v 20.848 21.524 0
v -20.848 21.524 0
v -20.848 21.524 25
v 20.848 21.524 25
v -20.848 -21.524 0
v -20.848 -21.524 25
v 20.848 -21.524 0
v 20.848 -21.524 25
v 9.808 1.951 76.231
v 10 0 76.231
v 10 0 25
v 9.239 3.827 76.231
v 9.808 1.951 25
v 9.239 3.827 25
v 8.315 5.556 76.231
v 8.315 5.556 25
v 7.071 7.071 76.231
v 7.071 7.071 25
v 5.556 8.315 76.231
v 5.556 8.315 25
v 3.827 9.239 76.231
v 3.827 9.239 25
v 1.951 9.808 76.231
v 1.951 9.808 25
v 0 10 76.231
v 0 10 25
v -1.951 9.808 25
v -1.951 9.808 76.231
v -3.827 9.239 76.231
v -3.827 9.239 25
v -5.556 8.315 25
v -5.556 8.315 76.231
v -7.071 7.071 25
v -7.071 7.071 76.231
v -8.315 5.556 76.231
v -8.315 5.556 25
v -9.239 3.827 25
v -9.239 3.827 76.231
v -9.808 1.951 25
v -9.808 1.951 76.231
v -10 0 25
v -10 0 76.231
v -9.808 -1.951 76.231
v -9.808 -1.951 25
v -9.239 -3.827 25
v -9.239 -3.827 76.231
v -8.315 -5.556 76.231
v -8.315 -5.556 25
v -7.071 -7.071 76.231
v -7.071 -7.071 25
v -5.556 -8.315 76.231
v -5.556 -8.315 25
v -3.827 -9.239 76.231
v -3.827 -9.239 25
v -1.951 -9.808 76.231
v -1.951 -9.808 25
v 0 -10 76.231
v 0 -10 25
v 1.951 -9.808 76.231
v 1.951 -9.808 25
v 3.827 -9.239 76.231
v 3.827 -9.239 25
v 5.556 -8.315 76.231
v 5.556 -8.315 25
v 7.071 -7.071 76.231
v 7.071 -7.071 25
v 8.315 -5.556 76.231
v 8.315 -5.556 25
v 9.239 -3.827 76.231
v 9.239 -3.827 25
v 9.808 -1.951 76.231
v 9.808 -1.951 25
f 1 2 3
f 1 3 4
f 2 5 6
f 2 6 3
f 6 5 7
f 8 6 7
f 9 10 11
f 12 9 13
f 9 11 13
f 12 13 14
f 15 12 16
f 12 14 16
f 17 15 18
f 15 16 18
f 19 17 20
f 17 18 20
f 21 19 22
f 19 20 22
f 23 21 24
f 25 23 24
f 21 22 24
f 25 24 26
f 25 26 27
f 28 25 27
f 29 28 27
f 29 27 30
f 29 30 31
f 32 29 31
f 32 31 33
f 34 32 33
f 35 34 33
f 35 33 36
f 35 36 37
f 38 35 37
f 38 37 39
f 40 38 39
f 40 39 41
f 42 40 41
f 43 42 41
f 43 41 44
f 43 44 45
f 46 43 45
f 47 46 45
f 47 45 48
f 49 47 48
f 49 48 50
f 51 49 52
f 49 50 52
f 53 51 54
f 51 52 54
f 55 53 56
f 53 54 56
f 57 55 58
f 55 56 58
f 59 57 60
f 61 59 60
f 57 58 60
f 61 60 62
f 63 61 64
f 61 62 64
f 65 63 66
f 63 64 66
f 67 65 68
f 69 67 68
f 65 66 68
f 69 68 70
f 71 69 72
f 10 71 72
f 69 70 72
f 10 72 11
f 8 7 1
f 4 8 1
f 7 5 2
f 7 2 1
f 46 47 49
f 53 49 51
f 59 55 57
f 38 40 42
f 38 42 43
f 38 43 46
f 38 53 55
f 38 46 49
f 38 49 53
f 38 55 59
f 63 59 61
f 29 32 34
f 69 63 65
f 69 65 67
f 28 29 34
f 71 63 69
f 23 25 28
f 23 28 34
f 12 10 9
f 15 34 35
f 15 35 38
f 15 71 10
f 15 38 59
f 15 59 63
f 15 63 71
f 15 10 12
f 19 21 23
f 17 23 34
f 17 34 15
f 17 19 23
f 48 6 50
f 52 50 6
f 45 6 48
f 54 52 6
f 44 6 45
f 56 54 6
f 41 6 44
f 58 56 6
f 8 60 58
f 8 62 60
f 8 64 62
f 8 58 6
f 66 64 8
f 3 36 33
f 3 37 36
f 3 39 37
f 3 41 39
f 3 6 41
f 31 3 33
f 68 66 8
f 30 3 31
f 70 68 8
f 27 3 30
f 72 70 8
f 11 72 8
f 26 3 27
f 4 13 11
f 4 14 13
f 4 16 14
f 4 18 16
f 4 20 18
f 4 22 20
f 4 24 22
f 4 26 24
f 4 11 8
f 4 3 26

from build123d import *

# Parameters (mm, degrees)
F0_R     = 10
F1_DEPTH = 76.230982
F2_W     = 41.696184
F2_H     = 43.047138
F2_R     = 10
F3_DEPTH = 25


with BuildPart() as f1:
    # F0 (on Top) → F1 (new body)
    with BuildSketch(Plane.XY):
        Circle(F0_R)
    extrude(amount=F1_DEPTH)

    # F2 (on face) → F3 (join)
    with BuildSketch(Plane.XY):
        Rectangle(F2_W, F2_H)
        Circle(F2_R, mode=Mode.SUBTRACT)
    extrude(amount=F3_DEPTH)


solid = f1.part
